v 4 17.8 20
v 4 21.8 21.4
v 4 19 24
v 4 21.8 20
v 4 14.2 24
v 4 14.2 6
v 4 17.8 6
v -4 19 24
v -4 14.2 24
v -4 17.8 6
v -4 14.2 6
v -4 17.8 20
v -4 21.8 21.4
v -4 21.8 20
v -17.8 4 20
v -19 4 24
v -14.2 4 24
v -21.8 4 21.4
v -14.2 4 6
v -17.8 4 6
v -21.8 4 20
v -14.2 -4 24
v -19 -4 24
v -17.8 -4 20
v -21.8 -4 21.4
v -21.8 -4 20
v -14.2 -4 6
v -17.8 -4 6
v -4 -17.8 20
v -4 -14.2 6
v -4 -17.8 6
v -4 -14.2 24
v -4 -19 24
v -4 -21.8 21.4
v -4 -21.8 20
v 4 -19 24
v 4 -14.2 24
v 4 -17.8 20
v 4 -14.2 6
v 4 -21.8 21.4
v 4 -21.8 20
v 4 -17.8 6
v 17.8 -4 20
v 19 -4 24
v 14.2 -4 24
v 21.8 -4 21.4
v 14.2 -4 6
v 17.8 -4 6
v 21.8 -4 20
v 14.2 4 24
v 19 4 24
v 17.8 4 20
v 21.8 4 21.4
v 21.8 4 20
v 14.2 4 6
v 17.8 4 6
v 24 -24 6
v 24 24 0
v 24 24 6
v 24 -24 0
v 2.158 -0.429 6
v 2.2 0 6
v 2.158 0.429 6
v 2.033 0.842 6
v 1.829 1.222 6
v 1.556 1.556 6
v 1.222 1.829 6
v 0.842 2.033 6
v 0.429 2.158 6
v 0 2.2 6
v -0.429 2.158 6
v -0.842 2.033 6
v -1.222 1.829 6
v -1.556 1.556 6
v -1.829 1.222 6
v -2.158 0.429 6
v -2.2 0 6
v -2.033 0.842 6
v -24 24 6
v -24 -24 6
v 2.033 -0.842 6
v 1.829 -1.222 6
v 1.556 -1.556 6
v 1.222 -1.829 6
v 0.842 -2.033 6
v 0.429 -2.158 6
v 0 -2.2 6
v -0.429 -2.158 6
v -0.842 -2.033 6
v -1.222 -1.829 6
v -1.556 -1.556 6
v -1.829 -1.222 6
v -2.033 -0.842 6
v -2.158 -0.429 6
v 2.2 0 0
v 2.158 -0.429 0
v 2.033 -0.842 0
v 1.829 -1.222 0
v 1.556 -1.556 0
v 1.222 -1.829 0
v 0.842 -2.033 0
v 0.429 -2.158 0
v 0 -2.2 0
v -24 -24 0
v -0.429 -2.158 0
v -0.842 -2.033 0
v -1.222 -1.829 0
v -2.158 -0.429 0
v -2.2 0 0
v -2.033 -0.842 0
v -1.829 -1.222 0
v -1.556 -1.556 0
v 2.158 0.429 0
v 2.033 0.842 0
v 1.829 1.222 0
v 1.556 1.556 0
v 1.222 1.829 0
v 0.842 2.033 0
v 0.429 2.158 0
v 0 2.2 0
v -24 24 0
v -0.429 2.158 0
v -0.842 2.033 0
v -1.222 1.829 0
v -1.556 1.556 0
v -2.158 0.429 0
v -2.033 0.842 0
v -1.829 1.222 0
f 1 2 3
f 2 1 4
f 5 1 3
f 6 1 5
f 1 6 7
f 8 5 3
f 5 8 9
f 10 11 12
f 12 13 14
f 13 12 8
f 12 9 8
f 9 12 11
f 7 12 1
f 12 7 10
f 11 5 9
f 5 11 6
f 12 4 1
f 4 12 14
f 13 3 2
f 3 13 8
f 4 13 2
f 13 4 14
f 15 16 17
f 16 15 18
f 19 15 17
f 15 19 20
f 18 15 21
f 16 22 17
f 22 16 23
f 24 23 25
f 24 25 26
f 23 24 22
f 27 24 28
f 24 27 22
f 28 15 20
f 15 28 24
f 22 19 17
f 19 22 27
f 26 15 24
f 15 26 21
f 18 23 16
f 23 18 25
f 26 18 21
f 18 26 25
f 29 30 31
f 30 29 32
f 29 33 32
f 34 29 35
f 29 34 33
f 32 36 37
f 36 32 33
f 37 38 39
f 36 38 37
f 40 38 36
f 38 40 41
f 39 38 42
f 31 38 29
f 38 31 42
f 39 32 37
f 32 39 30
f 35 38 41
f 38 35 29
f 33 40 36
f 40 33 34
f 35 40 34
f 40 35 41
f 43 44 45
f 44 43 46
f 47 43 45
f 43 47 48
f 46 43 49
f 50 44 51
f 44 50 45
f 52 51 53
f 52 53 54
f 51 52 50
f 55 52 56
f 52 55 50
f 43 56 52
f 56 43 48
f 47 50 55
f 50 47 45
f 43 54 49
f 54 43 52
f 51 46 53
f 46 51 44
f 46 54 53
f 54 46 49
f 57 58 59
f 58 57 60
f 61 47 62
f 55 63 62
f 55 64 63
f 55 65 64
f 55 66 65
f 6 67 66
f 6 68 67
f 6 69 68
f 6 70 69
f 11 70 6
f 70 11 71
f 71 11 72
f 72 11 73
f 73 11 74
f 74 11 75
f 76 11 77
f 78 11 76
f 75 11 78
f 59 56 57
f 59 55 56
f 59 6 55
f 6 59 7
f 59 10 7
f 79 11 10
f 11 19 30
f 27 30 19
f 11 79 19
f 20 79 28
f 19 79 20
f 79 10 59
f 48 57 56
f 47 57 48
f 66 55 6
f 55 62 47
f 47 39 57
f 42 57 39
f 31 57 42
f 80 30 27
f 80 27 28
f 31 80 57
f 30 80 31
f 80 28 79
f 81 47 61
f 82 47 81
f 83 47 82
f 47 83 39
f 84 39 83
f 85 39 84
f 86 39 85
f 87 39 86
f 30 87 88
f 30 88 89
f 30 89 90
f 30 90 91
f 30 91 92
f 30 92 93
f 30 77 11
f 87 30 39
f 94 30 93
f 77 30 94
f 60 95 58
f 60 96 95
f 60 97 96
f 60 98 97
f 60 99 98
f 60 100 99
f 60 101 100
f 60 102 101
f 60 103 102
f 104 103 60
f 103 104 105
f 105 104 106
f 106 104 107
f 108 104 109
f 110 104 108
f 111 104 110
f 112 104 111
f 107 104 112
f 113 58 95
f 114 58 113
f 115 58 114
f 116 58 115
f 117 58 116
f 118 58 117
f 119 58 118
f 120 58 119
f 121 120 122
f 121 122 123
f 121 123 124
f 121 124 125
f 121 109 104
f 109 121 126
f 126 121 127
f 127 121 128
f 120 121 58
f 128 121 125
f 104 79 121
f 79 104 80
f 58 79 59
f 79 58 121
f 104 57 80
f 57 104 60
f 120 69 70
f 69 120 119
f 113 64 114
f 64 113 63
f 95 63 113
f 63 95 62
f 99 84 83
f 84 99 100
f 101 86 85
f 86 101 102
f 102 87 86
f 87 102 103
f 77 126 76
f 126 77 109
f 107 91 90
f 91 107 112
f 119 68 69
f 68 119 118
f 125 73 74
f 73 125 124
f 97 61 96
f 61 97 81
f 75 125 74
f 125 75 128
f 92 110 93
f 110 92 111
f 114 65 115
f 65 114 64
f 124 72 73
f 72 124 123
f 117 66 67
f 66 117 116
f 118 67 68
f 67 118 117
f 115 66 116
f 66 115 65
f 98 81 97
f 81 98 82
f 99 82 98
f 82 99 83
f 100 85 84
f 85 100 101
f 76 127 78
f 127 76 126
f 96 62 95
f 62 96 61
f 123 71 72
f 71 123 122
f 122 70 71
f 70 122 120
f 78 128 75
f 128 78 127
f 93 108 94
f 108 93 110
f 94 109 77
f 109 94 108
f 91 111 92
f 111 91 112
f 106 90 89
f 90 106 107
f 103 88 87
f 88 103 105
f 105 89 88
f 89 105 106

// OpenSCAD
$fn = 32;

// ----------------------------------------------------------------------
// Snap-fit latch: 4 arms, 18 mm tall, 4.2 mm undercut hooks
// ----------------------------------------------------------------------

// --- parameters (mm) ---
base_d = 48;              // base plate depth
base_h = 6;               // base plate thickness
span = 32;                // distance between opposite arms
arm_t = 3.6;              // arm thickness
arm_d = 8;                // arm width
height = 18;              // free arm length
head_len = 4.2;           // hook reach
head_h = 4;               // hook height
lead = 1.4;               // lead-in ramp thickness
bore_d = 4.4;             // base fixing bore
top_z = 24;               // height of the arm tips above the base

arms = 4;

difference() {
  union() {
    /* base plate, centred on the arm ring */
    translate([-24, -24, 0]) cube([base_d, base_d, base_h]);
    for (a = [0 : 360 / arms : 359]) rotate([0, 0, a]) {
    /* arm, sunk 0.5 mm into the base */
    translate([-arm_d / 2, span / 2 - arm_t / 2, base_h - 0.5]) cube([arm_d, arm_t, height + 0.5]);
    /* hook: a convex hull of a tall inner block and a thin outer lip
       gives a flat undercut below and a lead-in ramp on top */
    hull() {
      translate([-arm_d / 2, span / 2 + arm_t / 2 - 0.6, top_z - head_h]) cube([arm_d, lead + 0.4, head_h]);
      translate([-arm_d / 2, span / 2 + arm_t / 2 - 0.2, top_z - head_h]) cube([arm_d, head_len, lead]);
    }
    }
  }
  translate([0, 0, -2.5]) cylinder(h = base_h + 5, d = bore_d);
}
